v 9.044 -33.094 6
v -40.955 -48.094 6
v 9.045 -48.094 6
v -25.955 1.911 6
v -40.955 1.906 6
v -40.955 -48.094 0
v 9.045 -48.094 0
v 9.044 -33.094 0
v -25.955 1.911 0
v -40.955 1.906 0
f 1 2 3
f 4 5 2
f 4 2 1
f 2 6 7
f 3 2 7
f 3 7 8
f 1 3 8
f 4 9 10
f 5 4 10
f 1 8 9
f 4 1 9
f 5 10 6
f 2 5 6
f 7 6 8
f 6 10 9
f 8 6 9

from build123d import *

# Parameters (mm, degrees)
F1_DEPTH = 6


with BuildPart() as f1:
    # F0 (on Top) → F1 (new body)
    with BuildSketch(Plane.XY):
        Polygon((-33.457938, -5.590482), (-40.954886, 1.906467), (-40.954886, -48.093533), (9.045114, -48.093533), align=None)
        Polygon((-25.954887, 1.911273), (-40.954886, 1.906467), (-33.457938, -5.590482), align=None)
        Polygon((-25.954887, 1.911273), (-33.457938, -5.590482), (9.045114, -48.093533), (9.043877, -33.093533), align=None)
    extrude(amount=F1_DEPTH)


solid = f1.part
